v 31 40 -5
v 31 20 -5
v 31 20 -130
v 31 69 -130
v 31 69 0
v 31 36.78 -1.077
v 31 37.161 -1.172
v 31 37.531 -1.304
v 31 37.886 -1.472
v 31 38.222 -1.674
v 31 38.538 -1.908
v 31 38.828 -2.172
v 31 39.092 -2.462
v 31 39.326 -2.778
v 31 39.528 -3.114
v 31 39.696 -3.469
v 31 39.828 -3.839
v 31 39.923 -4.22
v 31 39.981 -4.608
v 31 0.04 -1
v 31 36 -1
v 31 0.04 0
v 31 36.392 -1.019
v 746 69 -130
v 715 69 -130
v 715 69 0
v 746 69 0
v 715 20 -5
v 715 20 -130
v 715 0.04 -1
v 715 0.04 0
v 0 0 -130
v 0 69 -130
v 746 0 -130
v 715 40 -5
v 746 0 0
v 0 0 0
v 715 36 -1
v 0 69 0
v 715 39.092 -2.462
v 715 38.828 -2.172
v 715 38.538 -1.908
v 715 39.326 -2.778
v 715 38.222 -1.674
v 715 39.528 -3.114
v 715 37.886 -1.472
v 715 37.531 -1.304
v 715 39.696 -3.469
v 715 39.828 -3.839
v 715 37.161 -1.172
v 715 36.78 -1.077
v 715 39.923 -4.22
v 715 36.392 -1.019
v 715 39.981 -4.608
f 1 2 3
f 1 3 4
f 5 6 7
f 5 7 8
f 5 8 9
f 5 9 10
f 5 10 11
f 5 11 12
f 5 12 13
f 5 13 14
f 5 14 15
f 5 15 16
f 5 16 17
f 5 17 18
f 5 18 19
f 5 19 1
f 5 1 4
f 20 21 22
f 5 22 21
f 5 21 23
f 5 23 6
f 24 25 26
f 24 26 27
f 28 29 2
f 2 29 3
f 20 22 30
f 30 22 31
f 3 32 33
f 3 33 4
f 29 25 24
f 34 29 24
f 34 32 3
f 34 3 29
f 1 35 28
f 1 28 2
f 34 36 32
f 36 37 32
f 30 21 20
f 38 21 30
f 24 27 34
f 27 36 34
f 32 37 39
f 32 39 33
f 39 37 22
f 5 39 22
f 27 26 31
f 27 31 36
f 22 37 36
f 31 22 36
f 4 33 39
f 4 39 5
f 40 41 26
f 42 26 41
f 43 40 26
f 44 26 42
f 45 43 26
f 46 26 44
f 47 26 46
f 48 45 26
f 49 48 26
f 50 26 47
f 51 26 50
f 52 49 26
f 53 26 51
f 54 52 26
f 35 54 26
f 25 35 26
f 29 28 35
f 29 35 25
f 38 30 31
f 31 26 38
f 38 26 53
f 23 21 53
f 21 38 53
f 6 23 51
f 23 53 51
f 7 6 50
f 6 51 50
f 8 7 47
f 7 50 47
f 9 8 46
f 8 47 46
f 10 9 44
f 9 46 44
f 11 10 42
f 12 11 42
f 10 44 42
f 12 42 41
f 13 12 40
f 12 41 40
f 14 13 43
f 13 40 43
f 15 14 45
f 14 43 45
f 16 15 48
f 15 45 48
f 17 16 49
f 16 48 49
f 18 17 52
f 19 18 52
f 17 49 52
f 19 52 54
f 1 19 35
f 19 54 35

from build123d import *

# Parameters (mm, degrees)
CROQUIS2_W              = 31
CROQUIS2_H              = 130
SALIENTE_EXTRUIR1_DEPTH = 69
CROQUIS3_W              = 130
CROQUIS3_H              = 40
SALIENTE_EXTRUIR2_DEPTH = 715
CROQUIS4_W              = 31
CROQUIS4_H              = 130
SALIENTE_EXTRUIR3_DEPTH = 29
CROQUIS7_W              = 684
CROQUIS7_H              = 20
CORTAR_EXTRUIR2_DEPTH   = 125
CROQUIS8_W              = 684
CROQUIS8_H              = 39.960038326
CORTAR_EXTRUIR3_DEPTH   = 1
REDONDEO1_R             = 4


with BuildPart() as part:
    # Croquis2 → Saliente-Extruir1 (new body)
    with BuildSketch(Plane(origin=(0, 0, 0), x_dir=(1, 0, 0), z_dir=(0, 1, 0))):
        with Locations((15.5, 65)):
            Rectangle(CROQUIS2_W, CROQUIS2_H)
    extrude(amount=SALIENTE_EXTRUIR1_DEPTH)

    # Croquis3 → Saliente-Extruir2 (add)
    with BuildSketch(Plane(origin=(31, 0, 0), x_dir=(0, 0, -1), z_dir=(1, 0, 0))):
        with Locations((65, 20)):
            Rectangle(CROQUIS3_W, CROQUIS3_H)
    extrude(amount=SALIENTE_EXTRUIR2_DEPTH)

    # Croquis4 → Saliente-Extruir3 (add)
    with BuildSketch(Plane(origin=(0, 40, 0), x_dir=(1, 0, 0), z_dir=(0, 1, 0))):
        with Locations((730.5, 65)):
            Rectangle(CROQUIS4_W, CROQUIS4_H)
    extrude(amount=SALIENTE_EXTRUIR3_DEPTH)

    # Croquis7 → Cortar-Extruir2 (cut)
    with BuildSketch(Plane(origin=(0, 0, -130), x_dir=(-1, 0, 0), z_dir=(0, 0, -1))):
        with Locations((-373, 30)):
            Rectangle(CROQUIS7_W, CROQUIS7_H)
    extrude(amount=-CORTAR_EXTRUIR2_DEPTH, mode=Mode.SUBTRACT)

    # Croquis8 → Cortar-Extruir3 (cut)
    with BuildSketch(Plane.XY):
        with Locations((373, 20.019980837)):
            Rectangle(CROQUIS8_W, CROQUIS8_H)
    extrude(amount=-CORTAR_EXTRUIR3_DEPTH, mode=Mode.SUBTRACT)

    # Redondeo1
    redondeo1_edges = [part.edges().sort_by_distance(p)[0] for p in [
        (373, 40, -1),
    ]]
    fillet(redondeo1_edges, radius=REDONDEO1_R - 0.0001)  # a hair under: the kernel refuses the full size


solid = part.part
